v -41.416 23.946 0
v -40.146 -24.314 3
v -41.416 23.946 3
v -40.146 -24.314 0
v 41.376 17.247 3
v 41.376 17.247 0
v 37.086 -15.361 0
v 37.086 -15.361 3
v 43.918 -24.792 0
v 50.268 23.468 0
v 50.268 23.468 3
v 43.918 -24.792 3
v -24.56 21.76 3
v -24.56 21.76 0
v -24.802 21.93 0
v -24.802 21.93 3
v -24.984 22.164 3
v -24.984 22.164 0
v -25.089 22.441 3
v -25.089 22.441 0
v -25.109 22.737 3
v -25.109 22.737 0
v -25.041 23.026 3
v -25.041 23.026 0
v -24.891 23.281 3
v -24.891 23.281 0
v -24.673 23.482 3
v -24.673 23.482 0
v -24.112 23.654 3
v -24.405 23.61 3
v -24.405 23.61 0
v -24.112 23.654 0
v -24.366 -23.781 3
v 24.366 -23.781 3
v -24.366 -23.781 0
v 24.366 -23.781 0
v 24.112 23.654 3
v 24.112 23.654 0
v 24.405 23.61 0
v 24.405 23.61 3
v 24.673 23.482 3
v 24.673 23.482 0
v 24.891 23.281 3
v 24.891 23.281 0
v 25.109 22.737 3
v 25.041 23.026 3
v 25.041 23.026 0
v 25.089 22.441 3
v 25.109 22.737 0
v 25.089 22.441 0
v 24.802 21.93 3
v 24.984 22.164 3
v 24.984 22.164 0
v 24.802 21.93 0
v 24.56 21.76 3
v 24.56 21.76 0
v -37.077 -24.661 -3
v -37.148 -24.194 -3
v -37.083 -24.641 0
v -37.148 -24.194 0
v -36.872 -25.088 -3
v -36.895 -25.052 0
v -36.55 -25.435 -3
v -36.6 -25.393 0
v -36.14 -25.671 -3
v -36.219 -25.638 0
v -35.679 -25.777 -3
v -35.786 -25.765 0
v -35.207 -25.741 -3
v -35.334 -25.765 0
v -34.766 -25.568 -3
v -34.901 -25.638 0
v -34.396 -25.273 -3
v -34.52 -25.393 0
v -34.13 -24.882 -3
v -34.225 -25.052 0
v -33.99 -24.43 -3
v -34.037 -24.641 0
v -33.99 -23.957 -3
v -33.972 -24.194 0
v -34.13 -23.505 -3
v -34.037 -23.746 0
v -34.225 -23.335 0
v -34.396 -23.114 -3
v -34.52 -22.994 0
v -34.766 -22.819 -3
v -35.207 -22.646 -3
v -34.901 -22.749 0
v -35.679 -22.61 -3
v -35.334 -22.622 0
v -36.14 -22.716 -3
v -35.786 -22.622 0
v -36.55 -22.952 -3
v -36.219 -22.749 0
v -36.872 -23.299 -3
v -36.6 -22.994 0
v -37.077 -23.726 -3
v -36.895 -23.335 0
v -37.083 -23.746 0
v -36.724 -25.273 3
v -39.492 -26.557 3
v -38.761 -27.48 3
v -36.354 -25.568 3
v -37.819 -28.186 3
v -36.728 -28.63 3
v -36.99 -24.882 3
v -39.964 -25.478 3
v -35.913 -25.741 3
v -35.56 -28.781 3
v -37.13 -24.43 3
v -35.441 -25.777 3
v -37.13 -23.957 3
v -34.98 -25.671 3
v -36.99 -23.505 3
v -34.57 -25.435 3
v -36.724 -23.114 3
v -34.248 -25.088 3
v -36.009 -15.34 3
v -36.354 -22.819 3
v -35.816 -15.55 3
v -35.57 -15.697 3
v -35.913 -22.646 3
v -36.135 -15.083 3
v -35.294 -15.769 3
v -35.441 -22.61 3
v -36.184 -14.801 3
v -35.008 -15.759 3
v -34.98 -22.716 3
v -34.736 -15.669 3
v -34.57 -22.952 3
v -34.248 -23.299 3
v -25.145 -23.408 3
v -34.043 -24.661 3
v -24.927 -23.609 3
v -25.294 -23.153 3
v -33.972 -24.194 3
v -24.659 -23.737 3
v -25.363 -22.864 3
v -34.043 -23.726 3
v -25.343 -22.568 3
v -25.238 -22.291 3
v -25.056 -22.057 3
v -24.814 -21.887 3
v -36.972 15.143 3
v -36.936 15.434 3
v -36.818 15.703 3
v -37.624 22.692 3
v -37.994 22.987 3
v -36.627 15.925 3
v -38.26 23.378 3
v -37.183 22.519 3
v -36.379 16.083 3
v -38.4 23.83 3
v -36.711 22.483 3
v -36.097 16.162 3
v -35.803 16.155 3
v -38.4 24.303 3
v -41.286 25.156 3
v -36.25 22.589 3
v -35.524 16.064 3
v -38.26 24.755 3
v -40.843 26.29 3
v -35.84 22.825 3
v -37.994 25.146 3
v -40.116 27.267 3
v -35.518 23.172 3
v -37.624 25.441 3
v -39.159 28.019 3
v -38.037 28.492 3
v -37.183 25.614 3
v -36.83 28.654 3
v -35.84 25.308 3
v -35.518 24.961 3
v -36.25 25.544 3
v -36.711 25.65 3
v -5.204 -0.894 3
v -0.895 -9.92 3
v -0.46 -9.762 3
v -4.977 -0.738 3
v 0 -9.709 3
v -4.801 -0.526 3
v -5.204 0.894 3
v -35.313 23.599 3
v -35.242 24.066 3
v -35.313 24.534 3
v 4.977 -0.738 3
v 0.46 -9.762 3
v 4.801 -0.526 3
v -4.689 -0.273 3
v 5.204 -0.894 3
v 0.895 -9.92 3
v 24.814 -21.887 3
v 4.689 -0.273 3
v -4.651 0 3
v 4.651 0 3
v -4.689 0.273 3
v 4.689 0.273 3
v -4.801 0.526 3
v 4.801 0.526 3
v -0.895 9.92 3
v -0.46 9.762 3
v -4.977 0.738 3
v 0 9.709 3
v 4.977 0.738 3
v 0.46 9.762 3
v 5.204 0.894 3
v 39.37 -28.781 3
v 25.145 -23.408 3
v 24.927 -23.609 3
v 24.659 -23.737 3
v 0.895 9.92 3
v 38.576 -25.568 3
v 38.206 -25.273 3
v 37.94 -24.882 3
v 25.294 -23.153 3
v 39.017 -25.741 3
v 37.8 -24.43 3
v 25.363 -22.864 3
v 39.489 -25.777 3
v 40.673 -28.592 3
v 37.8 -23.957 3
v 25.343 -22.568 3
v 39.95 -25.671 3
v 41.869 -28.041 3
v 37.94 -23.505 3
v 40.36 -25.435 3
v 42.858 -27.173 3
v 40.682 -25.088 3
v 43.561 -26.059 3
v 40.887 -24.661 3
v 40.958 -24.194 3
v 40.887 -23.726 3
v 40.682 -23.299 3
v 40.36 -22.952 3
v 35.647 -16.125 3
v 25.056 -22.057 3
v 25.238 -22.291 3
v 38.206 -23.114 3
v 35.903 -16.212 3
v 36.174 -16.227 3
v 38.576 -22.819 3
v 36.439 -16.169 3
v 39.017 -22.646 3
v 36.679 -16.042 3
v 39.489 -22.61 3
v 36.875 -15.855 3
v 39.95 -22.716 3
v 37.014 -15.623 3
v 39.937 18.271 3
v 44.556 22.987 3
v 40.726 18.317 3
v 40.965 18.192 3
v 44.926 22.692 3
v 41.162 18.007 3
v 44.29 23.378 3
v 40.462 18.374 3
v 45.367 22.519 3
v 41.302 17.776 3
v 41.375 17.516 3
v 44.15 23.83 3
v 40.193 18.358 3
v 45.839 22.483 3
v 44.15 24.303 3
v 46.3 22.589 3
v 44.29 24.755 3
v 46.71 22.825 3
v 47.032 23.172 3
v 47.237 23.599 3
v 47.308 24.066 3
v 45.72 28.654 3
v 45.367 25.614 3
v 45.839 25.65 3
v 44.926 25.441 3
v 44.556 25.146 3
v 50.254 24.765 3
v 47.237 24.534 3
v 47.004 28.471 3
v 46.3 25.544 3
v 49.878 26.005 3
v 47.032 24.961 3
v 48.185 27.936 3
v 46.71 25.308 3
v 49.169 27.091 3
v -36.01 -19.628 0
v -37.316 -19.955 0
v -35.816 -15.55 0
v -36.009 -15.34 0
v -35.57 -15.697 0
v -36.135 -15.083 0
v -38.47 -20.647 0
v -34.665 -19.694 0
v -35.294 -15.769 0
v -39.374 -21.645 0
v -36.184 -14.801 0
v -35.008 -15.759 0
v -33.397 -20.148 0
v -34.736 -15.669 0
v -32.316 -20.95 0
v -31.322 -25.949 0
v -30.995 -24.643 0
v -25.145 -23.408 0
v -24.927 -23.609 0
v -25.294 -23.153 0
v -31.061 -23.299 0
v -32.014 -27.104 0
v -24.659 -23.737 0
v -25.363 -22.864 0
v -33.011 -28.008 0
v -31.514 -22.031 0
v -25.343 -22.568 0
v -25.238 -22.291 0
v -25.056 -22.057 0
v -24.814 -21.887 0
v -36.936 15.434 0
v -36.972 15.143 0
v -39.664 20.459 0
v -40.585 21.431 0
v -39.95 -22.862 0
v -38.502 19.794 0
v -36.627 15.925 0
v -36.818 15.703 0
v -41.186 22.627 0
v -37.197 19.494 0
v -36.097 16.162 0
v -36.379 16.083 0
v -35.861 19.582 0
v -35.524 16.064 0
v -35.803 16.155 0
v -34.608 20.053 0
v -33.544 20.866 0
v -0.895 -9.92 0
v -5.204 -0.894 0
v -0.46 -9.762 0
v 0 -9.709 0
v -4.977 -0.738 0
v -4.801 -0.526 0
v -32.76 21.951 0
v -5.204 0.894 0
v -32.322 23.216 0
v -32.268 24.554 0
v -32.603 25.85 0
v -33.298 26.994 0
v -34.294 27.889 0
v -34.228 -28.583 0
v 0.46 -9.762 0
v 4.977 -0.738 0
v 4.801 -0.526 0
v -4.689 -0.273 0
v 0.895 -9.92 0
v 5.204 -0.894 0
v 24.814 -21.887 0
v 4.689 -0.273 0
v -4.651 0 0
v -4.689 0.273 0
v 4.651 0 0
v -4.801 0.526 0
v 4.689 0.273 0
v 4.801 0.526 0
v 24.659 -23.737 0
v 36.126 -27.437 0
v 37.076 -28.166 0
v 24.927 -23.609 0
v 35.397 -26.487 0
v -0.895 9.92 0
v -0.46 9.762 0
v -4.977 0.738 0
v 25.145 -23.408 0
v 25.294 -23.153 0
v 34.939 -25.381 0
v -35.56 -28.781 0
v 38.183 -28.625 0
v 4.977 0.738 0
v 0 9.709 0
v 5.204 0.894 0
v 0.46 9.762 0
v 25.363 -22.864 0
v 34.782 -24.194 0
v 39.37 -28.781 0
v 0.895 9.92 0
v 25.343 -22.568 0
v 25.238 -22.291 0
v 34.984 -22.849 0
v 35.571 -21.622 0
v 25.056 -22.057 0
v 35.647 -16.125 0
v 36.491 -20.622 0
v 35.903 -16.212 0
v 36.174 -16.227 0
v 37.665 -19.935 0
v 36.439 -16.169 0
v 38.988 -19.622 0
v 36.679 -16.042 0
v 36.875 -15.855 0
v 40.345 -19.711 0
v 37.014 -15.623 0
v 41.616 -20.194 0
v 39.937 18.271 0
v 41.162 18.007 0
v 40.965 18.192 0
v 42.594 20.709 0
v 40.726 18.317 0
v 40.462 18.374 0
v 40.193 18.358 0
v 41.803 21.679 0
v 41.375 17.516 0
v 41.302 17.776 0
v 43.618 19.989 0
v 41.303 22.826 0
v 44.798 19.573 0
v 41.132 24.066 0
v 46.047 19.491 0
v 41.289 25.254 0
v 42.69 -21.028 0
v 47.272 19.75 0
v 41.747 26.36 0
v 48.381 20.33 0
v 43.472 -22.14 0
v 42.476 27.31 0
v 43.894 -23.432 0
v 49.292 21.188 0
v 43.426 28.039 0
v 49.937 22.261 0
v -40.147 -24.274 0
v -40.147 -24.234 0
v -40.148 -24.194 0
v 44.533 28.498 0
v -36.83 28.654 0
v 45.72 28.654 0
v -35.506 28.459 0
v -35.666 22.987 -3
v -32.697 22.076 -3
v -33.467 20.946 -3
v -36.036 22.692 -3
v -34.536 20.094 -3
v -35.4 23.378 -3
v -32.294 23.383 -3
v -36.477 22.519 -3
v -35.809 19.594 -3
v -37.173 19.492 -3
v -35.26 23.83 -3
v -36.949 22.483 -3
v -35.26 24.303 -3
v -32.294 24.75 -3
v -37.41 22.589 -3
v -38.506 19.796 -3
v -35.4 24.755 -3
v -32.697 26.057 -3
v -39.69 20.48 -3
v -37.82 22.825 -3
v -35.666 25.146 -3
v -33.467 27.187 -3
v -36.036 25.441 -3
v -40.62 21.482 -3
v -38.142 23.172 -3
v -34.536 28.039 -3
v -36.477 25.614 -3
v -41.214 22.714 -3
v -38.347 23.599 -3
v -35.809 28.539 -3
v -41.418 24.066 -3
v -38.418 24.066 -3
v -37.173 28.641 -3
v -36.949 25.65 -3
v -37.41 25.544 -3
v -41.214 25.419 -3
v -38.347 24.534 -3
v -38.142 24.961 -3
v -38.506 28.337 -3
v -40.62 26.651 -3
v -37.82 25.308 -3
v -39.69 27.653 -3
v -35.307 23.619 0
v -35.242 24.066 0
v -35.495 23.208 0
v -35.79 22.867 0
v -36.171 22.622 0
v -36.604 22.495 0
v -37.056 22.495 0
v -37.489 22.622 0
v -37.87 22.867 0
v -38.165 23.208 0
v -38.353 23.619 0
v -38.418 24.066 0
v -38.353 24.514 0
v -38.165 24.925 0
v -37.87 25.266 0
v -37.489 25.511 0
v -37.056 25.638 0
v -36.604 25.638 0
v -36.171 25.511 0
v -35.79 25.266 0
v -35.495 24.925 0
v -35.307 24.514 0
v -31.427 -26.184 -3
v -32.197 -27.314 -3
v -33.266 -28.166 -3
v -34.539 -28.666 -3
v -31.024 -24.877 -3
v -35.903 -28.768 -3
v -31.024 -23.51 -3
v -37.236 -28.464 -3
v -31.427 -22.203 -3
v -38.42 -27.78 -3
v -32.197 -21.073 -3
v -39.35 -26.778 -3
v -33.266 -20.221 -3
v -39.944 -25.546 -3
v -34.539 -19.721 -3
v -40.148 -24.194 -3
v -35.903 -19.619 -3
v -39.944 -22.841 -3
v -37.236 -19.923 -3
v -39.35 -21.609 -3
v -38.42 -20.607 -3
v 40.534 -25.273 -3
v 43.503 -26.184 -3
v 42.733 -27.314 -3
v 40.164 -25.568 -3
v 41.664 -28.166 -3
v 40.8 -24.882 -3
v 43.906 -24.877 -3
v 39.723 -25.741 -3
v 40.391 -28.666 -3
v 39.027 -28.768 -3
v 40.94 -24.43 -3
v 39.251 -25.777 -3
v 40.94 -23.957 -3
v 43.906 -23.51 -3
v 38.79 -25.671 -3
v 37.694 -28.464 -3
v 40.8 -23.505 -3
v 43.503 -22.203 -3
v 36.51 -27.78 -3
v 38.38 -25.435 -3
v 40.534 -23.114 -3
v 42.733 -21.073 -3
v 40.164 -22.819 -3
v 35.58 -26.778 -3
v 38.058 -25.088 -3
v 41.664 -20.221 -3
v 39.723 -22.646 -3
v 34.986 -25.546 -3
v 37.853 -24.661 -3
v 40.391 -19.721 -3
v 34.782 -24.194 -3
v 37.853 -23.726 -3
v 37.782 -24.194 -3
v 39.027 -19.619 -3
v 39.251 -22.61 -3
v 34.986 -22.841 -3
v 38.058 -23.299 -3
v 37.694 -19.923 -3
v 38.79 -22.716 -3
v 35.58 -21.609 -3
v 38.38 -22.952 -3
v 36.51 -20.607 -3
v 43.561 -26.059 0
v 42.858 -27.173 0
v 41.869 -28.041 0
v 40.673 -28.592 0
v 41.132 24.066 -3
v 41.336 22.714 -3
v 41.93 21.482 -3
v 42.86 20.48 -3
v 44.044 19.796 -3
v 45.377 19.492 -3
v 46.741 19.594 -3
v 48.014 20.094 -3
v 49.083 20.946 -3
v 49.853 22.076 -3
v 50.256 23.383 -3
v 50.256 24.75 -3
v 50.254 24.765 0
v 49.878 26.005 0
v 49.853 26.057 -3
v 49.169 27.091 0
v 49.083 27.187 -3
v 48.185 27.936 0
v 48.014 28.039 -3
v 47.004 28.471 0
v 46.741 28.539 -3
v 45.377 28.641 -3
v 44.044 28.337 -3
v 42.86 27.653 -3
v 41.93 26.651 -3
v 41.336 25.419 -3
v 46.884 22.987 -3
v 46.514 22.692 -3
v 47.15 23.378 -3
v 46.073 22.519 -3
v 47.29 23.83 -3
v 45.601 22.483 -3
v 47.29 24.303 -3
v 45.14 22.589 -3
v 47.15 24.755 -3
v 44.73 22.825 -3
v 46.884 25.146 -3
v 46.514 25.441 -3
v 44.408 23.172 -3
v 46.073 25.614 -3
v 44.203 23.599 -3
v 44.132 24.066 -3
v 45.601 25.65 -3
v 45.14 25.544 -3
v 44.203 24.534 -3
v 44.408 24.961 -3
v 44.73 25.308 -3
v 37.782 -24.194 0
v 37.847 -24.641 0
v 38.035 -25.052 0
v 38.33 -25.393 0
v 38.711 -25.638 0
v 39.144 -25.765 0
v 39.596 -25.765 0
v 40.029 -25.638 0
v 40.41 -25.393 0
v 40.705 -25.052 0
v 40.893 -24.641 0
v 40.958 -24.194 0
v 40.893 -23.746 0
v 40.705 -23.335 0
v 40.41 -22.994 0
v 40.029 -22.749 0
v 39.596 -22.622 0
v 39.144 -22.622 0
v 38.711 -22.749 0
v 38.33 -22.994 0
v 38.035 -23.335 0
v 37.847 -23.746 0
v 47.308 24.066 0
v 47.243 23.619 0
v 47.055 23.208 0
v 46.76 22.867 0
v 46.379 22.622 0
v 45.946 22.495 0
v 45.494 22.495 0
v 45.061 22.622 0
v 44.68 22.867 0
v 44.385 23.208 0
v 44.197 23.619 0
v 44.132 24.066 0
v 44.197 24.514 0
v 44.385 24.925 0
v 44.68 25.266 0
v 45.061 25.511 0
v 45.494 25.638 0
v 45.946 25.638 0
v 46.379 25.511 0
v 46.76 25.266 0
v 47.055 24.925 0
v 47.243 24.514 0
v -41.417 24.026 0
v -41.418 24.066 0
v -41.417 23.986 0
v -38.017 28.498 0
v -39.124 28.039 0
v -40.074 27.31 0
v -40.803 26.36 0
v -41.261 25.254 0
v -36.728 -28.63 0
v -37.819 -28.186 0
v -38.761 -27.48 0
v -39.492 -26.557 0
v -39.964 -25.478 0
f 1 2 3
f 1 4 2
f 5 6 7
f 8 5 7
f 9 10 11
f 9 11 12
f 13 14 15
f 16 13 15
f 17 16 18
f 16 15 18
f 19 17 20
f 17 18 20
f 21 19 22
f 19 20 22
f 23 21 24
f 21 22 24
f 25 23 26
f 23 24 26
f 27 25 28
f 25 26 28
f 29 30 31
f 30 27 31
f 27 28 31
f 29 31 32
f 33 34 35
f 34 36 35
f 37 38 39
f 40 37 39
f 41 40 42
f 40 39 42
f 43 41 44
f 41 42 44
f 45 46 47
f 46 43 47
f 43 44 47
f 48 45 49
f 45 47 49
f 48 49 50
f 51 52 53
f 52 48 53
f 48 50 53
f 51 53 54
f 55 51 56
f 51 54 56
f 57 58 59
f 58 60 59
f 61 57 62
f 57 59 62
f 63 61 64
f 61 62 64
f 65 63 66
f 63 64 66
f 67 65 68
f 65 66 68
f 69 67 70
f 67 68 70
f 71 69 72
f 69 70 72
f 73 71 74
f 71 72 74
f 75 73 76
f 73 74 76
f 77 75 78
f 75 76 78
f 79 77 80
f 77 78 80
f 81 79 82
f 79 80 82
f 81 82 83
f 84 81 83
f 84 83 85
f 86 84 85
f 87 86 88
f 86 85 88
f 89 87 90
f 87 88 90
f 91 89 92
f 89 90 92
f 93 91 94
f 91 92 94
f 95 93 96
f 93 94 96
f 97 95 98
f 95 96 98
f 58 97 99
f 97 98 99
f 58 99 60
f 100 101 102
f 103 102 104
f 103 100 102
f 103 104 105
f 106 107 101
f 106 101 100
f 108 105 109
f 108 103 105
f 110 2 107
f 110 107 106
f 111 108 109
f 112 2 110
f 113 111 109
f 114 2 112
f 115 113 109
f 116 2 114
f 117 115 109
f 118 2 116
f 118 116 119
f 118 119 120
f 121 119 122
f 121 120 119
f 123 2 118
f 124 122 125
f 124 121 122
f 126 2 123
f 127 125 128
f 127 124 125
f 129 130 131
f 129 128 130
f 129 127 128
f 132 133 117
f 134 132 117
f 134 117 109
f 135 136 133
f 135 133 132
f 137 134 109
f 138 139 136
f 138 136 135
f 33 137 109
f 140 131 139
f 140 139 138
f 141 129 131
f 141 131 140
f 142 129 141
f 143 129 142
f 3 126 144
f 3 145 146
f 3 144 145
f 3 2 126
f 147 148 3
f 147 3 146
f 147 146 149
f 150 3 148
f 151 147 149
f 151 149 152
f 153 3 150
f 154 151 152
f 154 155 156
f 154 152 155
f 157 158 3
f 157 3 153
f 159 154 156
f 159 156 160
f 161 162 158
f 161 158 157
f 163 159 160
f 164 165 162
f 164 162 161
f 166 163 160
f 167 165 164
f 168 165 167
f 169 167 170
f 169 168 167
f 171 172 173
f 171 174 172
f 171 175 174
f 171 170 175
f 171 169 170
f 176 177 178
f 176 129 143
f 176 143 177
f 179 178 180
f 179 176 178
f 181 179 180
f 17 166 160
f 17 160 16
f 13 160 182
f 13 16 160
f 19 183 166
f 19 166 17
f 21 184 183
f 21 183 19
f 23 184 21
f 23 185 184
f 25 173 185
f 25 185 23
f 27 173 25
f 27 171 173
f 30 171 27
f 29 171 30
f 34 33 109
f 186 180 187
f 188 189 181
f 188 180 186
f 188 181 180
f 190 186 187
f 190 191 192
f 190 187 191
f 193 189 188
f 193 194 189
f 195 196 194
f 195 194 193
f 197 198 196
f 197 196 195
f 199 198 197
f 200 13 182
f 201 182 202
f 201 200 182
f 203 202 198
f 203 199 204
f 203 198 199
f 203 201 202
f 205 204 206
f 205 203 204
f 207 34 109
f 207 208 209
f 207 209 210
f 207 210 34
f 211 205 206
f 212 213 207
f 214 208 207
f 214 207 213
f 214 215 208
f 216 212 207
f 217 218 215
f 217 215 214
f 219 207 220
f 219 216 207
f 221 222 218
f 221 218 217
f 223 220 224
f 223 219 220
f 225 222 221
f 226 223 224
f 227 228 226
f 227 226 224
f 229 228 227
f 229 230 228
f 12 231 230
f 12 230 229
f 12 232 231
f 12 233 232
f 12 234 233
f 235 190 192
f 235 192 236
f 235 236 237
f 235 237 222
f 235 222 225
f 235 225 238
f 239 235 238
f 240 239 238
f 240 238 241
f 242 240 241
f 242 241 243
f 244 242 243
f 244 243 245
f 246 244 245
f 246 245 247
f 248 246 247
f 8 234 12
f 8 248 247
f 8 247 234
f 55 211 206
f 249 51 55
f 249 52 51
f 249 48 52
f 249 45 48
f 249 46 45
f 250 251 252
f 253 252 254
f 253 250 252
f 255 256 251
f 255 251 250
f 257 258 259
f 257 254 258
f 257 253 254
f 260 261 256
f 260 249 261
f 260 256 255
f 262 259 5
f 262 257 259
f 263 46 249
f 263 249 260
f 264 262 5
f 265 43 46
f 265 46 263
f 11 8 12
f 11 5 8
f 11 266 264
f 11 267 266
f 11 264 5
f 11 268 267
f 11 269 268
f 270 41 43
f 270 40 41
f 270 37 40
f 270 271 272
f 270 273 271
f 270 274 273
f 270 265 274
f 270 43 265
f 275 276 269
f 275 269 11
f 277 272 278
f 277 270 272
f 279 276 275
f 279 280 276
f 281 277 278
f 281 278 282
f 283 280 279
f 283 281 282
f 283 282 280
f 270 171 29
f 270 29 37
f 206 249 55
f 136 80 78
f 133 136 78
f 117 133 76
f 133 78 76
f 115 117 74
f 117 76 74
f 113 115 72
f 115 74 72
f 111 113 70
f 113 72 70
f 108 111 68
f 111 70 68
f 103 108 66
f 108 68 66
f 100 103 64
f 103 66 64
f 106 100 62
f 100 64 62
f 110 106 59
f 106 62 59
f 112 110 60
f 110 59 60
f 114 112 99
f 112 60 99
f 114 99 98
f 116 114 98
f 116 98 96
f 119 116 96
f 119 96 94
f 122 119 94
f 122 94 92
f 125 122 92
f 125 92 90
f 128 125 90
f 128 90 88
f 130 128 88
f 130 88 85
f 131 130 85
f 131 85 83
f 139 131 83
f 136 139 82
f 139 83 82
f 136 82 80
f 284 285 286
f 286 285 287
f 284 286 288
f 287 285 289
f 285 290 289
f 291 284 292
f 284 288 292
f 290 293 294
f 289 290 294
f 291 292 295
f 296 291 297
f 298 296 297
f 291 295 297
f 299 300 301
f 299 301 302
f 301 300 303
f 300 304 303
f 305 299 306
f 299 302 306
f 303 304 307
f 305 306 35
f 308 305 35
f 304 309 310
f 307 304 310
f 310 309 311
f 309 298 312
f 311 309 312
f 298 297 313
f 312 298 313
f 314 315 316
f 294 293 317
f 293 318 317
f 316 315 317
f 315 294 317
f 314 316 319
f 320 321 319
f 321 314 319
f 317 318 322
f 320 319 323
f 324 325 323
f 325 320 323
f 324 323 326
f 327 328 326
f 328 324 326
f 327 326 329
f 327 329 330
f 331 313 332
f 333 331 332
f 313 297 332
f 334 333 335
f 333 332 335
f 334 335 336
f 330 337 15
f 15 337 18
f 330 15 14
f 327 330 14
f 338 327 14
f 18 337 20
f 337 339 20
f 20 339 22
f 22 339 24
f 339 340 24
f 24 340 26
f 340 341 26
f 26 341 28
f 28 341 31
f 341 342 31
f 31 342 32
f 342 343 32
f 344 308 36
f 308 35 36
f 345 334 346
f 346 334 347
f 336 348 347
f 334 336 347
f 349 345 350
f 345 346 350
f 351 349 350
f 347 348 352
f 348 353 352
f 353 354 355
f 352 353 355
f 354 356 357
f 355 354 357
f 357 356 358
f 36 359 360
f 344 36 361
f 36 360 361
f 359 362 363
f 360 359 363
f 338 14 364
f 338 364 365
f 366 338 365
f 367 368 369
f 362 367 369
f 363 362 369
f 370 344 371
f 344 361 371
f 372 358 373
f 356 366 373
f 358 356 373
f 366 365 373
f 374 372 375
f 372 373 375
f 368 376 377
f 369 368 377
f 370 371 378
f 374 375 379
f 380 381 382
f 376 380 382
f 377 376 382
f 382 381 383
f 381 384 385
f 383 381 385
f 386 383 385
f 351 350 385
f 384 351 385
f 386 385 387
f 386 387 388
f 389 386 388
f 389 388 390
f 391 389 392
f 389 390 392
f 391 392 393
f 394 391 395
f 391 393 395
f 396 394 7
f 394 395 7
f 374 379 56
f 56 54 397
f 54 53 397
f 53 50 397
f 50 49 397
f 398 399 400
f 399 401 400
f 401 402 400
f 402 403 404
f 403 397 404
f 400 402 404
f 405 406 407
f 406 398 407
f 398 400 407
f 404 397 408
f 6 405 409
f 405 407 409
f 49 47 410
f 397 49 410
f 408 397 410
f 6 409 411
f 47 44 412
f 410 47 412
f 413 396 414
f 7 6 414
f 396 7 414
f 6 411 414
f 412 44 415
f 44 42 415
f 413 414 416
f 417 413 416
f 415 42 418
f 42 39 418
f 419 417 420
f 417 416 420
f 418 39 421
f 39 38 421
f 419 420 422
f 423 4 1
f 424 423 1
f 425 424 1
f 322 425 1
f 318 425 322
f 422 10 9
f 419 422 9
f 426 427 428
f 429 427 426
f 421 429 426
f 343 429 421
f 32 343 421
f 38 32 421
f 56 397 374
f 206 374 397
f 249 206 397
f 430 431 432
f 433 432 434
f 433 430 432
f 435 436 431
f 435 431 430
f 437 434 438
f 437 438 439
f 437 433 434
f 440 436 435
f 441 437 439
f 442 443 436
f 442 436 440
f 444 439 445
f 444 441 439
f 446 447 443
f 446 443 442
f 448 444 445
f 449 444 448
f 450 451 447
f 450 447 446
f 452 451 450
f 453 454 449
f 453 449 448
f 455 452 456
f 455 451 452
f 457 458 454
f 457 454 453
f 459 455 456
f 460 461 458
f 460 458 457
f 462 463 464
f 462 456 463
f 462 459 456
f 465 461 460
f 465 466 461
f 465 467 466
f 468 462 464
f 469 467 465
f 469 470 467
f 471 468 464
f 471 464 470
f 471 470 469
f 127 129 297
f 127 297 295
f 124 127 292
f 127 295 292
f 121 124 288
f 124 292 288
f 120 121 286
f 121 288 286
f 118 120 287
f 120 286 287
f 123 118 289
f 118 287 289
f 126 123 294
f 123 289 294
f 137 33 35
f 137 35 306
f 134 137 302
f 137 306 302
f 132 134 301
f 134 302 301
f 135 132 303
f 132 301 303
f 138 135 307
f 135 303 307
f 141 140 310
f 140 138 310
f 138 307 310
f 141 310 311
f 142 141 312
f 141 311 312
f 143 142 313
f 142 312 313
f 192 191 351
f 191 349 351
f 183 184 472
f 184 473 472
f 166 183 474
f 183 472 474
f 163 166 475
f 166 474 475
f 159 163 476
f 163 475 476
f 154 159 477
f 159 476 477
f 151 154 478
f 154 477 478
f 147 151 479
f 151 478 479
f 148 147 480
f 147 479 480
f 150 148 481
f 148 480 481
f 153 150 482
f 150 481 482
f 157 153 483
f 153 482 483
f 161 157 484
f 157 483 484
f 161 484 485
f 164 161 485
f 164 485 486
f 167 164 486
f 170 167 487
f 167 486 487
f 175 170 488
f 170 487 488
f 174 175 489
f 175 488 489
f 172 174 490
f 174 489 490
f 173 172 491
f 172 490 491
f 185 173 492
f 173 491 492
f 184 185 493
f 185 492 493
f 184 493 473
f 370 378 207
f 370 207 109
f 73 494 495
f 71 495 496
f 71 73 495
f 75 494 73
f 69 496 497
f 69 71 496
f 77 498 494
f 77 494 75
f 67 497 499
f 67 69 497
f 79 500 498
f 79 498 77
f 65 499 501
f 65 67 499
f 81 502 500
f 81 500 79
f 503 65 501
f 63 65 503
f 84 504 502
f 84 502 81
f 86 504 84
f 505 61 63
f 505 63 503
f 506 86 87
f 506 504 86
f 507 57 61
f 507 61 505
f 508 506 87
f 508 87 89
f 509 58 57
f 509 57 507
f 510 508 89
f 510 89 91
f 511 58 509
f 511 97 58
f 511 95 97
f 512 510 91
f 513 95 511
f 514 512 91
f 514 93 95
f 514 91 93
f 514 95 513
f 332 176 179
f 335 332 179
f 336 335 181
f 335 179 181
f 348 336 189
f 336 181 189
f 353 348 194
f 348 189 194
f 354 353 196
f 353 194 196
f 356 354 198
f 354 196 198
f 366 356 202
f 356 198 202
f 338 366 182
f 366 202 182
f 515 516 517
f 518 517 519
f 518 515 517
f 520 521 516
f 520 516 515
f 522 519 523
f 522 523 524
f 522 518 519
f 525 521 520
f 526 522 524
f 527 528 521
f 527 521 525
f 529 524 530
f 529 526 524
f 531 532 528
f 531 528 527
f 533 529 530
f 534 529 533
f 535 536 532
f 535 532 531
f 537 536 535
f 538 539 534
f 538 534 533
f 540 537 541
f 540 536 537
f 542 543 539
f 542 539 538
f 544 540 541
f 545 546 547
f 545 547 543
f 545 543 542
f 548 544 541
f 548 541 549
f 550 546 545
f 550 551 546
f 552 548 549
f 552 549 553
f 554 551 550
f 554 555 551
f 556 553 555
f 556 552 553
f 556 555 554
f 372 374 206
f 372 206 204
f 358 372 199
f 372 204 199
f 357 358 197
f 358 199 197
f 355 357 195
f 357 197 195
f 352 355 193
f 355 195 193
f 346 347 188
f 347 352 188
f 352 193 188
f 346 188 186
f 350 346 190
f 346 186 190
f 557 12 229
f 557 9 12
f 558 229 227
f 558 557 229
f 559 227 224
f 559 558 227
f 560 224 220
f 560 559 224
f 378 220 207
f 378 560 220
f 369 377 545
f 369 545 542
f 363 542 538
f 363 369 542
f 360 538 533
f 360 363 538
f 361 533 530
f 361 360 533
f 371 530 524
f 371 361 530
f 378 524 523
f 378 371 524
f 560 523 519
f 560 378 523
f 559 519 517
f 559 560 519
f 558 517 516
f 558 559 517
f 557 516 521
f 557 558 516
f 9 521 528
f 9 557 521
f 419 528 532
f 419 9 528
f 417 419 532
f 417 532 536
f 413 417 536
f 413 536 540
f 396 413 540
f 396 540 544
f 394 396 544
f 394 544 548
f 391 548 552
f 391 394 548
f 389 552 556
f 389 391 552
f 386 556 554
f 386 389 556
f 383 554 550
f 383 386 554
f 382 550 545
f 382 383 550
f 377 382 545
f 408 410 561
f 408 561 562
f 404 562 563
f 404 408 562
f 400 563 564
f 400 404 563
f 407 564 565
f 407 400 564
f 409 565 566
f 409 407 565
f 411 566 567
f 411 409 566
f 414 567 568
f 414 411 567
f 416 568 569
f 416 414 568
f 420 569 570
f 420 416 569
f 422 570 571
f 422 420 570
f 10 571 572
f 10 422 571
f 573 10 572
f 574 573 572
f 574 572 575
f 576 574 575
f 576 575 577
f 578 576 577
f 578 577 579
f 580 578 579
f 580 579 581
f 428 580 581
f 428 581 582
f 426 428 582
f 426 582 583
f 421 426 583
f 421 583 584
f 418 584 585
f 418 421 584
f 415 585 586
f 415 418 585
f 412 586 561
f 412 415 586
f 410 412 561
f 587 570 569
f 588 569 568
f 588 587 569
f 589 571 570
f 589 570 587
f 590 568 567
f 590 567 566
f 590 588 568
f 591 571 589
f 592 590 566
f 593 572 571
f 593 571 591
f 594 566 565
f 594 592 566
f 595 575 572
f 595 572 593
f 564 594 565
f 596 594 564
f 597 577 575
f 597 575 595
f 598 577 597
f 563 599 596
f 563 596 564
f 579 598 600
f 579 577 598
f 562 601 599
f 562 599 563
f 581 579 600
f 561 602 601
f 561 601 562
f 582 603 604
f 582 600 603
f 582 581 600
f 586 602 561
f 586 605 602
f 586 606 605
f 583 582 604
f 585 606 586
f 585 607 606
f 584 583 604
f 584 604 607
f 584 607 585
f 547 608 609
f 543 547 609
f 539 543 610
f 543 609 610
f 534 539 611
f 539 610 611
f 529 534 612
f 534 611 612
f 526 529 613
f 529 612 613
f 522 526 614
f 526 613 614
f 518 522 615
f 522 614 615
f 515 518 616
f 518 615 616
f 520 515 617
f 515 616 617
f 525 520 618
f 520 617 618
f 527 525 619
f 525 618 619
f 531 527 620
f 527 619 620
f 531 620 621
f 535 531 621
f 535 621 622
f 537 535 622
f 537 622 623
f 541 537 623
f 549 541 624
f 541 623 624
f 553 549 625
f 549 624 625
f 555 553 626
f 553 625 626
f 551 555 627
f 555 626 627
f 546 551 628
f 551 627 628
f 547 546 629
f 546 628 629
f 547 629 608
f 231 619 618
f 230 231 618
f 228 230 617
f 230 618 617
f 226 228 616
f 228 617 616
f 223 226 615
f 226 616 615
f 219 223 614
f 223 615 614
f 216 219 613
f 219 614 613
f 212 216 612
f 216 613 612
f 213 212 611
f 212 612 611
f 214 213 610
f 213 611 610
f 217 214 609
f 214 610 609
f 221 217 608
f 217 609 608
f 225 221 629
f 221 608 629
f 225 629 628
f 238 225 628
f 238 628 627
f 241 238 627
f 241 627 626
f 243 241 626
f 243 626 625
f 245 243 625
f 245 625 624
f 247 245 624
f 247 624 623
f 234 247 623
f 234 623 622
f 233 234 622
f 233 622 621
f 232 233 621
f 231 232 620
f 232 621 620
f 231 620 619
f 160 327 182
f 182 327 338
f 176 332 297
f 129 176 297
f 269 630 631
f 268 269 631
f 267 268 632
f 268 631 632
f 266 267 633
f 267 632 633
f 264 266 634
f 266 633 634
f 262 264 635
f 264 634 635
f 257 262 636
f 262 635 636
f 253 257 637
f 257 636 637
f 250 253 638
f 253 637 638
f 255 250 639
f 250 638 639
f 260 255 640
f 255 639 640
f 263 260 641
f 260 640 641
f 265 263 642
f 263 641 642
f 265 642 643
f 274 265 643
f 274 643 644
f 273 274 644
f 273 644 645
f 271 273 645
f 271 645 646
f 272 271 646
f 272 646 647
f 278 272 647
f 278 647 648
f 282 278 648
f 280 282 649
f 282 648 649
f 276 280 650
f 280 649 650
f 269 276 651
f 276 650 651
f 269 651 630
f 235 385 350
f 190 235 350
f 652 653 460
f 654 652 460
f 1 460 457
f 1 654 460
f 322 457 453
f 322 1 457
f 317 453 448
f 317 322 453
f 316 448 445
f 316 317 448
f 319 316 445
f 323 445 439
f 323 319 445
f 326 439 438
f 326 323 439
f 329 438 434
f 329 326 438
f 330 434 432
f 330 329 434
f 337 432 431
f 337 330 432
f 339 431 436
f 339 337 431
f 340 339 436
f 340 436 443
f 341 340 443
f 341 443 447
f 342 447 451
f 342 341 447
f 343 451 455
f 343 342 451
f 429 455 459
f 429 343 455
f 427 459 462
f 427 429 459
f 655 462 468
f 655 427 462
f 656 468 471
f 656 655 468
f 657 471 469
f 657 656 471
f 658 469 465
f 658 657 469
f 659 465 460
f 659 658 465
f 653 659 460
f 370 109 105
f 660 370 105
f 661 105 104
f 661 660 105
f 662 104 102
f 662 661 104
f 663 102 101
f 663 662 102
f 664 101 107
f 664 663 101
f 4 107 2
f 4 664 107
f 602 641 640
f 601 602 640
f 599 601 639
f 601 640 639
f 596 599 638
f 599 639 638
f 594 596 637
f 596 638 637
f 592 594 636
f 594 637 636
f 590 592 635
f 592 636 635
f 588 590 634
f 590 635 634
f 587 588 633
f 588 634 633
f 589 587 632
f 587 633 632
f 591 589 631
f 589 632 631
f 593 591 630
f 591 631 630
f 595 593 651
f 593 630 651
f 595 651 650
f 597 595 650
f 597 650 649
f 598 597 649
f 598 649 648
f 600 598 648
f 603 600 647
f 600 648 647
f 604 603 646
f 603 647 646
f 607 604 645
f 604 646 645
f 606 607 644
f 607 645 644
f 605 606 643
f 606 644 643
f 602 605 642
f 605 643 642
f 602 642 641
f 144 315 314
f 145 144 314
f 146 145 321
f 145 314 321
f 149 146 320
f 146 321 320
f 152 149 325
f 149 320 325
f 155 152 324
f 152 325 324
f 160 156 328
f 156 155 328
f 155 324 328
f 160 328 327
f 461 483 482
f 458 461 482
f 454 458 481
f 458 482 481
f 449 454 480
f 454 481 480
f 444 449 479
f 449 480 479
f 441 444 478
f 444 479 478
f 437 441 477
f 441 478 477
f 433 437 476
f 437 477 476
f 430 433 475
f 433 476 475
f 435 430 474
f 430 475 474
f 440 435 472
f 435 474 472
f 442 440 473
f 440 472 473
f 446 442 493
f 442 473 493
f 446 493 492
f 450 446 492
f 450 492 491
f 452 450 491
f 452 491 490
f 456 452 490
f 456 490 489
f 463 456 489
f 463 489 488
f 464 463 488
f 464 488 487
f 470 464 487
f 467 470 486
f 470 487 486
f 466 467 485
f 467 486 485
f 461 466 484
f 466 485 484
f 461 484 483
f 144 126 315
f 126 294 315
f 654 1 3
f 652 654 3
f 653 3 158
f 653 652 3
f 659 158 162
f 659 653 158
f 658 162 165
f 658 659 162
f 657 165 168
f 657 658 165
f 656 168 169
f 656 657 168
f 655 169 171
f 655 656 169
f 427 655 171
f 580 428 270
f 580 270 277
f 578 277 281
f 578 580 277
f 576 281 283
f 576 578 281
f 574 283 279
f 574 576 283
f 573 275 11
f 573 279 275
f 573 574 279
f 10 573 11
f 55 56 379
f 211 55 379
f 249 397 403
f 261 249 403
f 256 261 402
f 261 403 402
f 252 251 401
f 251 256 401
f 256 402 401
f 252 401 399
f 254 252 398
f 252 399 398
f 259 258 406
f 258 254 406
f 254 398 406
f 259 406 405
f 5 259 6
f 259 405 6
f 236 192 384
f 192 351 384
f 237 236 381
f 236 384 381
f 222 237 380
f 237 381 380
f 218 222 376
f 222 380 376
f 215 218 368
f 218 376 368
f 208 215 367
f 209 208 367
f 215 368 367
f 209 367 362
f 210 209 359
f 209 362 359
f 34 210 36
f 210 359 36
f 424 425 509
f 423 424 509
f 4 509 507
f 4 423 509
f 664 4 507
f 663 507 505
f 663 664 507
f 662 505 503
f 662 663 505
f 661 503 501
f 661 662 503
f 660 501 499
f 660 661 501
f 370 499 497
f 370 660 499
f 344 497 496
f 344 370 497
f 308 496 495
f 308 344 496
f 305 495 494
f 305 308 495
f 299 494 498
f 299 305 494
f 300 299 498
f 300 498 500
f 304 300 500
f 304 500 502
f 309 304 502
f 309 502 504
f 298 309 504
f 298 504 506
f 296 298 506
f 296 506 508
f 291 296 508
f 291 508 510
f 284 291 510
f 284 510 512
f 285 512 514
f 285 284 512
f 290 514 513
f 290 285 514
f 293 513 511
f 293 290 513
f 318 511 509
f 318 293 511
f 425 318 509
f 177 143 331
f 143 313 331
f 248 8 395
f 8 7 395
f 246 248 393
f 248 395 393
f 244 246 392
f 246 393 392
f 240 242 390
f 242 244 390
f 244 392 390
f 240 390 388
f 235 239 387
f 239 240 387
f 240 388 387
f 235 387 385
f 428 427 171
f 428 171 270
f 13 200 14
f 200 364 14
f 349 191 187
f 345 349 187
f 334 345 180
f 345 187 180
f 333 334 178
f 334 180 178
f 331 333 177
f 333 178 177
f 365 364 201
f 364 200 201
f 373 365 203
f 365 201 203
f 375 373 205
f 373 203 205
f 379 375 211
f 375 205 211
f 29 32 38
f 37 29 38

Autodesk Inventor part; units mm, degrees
ref_plane "YZ Plane" through (0, 0, 0) normal (1, 0, 0) x (0, 1, 0)
ref_plane "XZ Plane" through (0, 0, 0) normal (0, 1, 0) x (-1, 0, 0)
ref_plane "XY Plane" through (0, 0, 0) normal (0, 0, 1) x (1, 0, 0)
sketch "Sketch1" plane through (0, 0, 0) normal (0, 0, 1) x (1, 0, 0)
  circle A0 centre (-36.83, 24.0665) radius 1.5875 projected
  circle A1 centre (45.72, 24.0665) radius 1.5875 projected
  circle A2 centre (39.37, -24.1935) radius 1.5875 projected
  circle A3 centre (-35.56, -24.1935) radius 1.5875 projected
  arc A4 (-36.83, 28.654) -> (-41.4159, 23.9458) centre (-36.83, 24.0665) ccw
  arc A5 (-40.1459, -24.3142) -> (-35.56, -28.781) centre (-35.56, -24.1935) ccw
  arc A6 (39.37, -28.781) -> (43.9183, -24.792) centre (39.37, -24.1935) ccw
  arc A7 (50.2683, 23.468) -> (45.72, 28.654) centre (45.72, 24.0665) ccw
  line L0 (50.2683, 23.468) -> (43.9183, -24.792)
  line L1 (39.37, -28.781) -> (-35.56, -28.781)
  line L2 (-40.1459, -24.3142) -> (-41.4159, 23.9458)
  line L3 (-36.83, 28.654) -> (45.72, 28.654)
  point P0 (0, 0)
  dimension "d0" = 3
  dimension "d1" = 3
  dimension "d2" = 3
  dimension "d3" = 3
extrude "Main body" add sketch "Sketch1" along normal blind 3
sketch "Sketch3" plane through (0, 0, 0) normal (0, 0, -1) x (-1, 0, 0)
  circle A0 centre (35.56, -24.1935) radius 1.5875 projected
  circle A1 centre (-39.37, -24.1935) radius 1.5875 projected
  circle A2 centre (-45.72, 24.0665) radius 1.5875 projected
  circle A3 centre (36.83, 24.0665) radius 1.5875 projected
  circle A4 centre (35.56, -24.1935) radius 4.5875
  circle A5 centre (-39.37, -24.1935) radius 4.5875
  circle A6 centre (-45.72, 24.0665) radius 4.5875
  circle A7 centre (36.83, 24.0665) radius 4.5875
  point P0 (0, 0)
  dimension "d7" = 3
  dimension "d8" = 3
  dimension "d9" = 3
  dimension "d10" = 3
extrude "Standoff" add sketch "Sketch3" along normal blind 3
sketch "Sketch4" plane through (0, 0, 0) normal (0, 0, -1) x (-1, 0, 0)
  line L0 (28.3461, 23.654) -> (-28.3461, 23.654)
  line L1 (-28.3461, 23.654) -> (0, 9.4725)
  line L2 (0, 9.4725) -> (28.3461, 23.654)
  line L3 (37.0154, 16.8096) -> (3.4163, 0)
  line L4 (3.4163, 0) -> (36.1422, -16.3727)
  line L5 (36.1422, -16.3727) -> (37.0154, 16.8096)
  line L6 (28.5999, -23.781) -> (0, -9.4725)
  line L7 (0, -9.4725) -> (-28.5999, -23.781)
  line L8 (-28.5999, -23.781) -> (28.5999, -23.781)
  line L9 (35.56, -28.781) -> (-39.37, -28.781) projected
  line L10 (-45.72, 28.654) -> (36.83, 28.654) projected
  line L11 (-3.4163, 0) -> (-41.6219, 19.1142)
  line L12 (-41.6219, 19.1142) -> (-36.9025, -16.7531)
  line L13 (-36.9025, -16.7531) -> (-3.4163, 0)
  line L14 (-3.4163, 0) -> (3.4163, 0) construction
  line L15 (0, -9.4725) -> (0, 9.4725) construction
  line L16 (41.4159, 23.9458) -> (40.1459, -24.3142) construction
  line L17 (-43.9183, -24.792) -> (-50.2683, 23.468) construction
  point P0 (0, 0)
  dimension "d13" = 5
  dimension "d14" = 5
  dimension "d15" = 10
  dimension "d16" = 10
  dimension "d17" = 10
  dimension "d18" = 10
extrude "Extrusion3" cut sketch "Sketch4" against normal up to surface (3 mm away)
fillet "Fillet1" radius 1 8 edges at (-28.3461, 23.654, 1.5) (28.3461, 23.654, 1.5) (41.6219, 19.1142, 1.5) (36.9025, -16.7531, 1.5) (-28.5999, -23.781, 1.5) (-36.1422, -16.3727, 1.5) (-37.0154, 16.8096, 1.5) (28.5999, -23.781, 1.5)
fillet "Fillet2" radius 2 2 edges at (0, -9.4725, 1.5) (0, 9.4725, 1.5)
fillet "Fillet3" radius 1 2 edges at (-3.4163, 0, 1.5) (3.4163, 0, 1.5)
equation "\"d1\" = d0"
equation "\"d2\" = d0"
equation "\"d3\" = d0"
equation "\"d8\" = d7"
equation "\"d9\" = d7"
equation "\"d10\" = d7"
equation "\"d14\" = d13"
equation "\"d16\" = d15"
equation "\"d17\" = d15"
equation "\"d18\" = d15"
properties part number "RampsMount"
